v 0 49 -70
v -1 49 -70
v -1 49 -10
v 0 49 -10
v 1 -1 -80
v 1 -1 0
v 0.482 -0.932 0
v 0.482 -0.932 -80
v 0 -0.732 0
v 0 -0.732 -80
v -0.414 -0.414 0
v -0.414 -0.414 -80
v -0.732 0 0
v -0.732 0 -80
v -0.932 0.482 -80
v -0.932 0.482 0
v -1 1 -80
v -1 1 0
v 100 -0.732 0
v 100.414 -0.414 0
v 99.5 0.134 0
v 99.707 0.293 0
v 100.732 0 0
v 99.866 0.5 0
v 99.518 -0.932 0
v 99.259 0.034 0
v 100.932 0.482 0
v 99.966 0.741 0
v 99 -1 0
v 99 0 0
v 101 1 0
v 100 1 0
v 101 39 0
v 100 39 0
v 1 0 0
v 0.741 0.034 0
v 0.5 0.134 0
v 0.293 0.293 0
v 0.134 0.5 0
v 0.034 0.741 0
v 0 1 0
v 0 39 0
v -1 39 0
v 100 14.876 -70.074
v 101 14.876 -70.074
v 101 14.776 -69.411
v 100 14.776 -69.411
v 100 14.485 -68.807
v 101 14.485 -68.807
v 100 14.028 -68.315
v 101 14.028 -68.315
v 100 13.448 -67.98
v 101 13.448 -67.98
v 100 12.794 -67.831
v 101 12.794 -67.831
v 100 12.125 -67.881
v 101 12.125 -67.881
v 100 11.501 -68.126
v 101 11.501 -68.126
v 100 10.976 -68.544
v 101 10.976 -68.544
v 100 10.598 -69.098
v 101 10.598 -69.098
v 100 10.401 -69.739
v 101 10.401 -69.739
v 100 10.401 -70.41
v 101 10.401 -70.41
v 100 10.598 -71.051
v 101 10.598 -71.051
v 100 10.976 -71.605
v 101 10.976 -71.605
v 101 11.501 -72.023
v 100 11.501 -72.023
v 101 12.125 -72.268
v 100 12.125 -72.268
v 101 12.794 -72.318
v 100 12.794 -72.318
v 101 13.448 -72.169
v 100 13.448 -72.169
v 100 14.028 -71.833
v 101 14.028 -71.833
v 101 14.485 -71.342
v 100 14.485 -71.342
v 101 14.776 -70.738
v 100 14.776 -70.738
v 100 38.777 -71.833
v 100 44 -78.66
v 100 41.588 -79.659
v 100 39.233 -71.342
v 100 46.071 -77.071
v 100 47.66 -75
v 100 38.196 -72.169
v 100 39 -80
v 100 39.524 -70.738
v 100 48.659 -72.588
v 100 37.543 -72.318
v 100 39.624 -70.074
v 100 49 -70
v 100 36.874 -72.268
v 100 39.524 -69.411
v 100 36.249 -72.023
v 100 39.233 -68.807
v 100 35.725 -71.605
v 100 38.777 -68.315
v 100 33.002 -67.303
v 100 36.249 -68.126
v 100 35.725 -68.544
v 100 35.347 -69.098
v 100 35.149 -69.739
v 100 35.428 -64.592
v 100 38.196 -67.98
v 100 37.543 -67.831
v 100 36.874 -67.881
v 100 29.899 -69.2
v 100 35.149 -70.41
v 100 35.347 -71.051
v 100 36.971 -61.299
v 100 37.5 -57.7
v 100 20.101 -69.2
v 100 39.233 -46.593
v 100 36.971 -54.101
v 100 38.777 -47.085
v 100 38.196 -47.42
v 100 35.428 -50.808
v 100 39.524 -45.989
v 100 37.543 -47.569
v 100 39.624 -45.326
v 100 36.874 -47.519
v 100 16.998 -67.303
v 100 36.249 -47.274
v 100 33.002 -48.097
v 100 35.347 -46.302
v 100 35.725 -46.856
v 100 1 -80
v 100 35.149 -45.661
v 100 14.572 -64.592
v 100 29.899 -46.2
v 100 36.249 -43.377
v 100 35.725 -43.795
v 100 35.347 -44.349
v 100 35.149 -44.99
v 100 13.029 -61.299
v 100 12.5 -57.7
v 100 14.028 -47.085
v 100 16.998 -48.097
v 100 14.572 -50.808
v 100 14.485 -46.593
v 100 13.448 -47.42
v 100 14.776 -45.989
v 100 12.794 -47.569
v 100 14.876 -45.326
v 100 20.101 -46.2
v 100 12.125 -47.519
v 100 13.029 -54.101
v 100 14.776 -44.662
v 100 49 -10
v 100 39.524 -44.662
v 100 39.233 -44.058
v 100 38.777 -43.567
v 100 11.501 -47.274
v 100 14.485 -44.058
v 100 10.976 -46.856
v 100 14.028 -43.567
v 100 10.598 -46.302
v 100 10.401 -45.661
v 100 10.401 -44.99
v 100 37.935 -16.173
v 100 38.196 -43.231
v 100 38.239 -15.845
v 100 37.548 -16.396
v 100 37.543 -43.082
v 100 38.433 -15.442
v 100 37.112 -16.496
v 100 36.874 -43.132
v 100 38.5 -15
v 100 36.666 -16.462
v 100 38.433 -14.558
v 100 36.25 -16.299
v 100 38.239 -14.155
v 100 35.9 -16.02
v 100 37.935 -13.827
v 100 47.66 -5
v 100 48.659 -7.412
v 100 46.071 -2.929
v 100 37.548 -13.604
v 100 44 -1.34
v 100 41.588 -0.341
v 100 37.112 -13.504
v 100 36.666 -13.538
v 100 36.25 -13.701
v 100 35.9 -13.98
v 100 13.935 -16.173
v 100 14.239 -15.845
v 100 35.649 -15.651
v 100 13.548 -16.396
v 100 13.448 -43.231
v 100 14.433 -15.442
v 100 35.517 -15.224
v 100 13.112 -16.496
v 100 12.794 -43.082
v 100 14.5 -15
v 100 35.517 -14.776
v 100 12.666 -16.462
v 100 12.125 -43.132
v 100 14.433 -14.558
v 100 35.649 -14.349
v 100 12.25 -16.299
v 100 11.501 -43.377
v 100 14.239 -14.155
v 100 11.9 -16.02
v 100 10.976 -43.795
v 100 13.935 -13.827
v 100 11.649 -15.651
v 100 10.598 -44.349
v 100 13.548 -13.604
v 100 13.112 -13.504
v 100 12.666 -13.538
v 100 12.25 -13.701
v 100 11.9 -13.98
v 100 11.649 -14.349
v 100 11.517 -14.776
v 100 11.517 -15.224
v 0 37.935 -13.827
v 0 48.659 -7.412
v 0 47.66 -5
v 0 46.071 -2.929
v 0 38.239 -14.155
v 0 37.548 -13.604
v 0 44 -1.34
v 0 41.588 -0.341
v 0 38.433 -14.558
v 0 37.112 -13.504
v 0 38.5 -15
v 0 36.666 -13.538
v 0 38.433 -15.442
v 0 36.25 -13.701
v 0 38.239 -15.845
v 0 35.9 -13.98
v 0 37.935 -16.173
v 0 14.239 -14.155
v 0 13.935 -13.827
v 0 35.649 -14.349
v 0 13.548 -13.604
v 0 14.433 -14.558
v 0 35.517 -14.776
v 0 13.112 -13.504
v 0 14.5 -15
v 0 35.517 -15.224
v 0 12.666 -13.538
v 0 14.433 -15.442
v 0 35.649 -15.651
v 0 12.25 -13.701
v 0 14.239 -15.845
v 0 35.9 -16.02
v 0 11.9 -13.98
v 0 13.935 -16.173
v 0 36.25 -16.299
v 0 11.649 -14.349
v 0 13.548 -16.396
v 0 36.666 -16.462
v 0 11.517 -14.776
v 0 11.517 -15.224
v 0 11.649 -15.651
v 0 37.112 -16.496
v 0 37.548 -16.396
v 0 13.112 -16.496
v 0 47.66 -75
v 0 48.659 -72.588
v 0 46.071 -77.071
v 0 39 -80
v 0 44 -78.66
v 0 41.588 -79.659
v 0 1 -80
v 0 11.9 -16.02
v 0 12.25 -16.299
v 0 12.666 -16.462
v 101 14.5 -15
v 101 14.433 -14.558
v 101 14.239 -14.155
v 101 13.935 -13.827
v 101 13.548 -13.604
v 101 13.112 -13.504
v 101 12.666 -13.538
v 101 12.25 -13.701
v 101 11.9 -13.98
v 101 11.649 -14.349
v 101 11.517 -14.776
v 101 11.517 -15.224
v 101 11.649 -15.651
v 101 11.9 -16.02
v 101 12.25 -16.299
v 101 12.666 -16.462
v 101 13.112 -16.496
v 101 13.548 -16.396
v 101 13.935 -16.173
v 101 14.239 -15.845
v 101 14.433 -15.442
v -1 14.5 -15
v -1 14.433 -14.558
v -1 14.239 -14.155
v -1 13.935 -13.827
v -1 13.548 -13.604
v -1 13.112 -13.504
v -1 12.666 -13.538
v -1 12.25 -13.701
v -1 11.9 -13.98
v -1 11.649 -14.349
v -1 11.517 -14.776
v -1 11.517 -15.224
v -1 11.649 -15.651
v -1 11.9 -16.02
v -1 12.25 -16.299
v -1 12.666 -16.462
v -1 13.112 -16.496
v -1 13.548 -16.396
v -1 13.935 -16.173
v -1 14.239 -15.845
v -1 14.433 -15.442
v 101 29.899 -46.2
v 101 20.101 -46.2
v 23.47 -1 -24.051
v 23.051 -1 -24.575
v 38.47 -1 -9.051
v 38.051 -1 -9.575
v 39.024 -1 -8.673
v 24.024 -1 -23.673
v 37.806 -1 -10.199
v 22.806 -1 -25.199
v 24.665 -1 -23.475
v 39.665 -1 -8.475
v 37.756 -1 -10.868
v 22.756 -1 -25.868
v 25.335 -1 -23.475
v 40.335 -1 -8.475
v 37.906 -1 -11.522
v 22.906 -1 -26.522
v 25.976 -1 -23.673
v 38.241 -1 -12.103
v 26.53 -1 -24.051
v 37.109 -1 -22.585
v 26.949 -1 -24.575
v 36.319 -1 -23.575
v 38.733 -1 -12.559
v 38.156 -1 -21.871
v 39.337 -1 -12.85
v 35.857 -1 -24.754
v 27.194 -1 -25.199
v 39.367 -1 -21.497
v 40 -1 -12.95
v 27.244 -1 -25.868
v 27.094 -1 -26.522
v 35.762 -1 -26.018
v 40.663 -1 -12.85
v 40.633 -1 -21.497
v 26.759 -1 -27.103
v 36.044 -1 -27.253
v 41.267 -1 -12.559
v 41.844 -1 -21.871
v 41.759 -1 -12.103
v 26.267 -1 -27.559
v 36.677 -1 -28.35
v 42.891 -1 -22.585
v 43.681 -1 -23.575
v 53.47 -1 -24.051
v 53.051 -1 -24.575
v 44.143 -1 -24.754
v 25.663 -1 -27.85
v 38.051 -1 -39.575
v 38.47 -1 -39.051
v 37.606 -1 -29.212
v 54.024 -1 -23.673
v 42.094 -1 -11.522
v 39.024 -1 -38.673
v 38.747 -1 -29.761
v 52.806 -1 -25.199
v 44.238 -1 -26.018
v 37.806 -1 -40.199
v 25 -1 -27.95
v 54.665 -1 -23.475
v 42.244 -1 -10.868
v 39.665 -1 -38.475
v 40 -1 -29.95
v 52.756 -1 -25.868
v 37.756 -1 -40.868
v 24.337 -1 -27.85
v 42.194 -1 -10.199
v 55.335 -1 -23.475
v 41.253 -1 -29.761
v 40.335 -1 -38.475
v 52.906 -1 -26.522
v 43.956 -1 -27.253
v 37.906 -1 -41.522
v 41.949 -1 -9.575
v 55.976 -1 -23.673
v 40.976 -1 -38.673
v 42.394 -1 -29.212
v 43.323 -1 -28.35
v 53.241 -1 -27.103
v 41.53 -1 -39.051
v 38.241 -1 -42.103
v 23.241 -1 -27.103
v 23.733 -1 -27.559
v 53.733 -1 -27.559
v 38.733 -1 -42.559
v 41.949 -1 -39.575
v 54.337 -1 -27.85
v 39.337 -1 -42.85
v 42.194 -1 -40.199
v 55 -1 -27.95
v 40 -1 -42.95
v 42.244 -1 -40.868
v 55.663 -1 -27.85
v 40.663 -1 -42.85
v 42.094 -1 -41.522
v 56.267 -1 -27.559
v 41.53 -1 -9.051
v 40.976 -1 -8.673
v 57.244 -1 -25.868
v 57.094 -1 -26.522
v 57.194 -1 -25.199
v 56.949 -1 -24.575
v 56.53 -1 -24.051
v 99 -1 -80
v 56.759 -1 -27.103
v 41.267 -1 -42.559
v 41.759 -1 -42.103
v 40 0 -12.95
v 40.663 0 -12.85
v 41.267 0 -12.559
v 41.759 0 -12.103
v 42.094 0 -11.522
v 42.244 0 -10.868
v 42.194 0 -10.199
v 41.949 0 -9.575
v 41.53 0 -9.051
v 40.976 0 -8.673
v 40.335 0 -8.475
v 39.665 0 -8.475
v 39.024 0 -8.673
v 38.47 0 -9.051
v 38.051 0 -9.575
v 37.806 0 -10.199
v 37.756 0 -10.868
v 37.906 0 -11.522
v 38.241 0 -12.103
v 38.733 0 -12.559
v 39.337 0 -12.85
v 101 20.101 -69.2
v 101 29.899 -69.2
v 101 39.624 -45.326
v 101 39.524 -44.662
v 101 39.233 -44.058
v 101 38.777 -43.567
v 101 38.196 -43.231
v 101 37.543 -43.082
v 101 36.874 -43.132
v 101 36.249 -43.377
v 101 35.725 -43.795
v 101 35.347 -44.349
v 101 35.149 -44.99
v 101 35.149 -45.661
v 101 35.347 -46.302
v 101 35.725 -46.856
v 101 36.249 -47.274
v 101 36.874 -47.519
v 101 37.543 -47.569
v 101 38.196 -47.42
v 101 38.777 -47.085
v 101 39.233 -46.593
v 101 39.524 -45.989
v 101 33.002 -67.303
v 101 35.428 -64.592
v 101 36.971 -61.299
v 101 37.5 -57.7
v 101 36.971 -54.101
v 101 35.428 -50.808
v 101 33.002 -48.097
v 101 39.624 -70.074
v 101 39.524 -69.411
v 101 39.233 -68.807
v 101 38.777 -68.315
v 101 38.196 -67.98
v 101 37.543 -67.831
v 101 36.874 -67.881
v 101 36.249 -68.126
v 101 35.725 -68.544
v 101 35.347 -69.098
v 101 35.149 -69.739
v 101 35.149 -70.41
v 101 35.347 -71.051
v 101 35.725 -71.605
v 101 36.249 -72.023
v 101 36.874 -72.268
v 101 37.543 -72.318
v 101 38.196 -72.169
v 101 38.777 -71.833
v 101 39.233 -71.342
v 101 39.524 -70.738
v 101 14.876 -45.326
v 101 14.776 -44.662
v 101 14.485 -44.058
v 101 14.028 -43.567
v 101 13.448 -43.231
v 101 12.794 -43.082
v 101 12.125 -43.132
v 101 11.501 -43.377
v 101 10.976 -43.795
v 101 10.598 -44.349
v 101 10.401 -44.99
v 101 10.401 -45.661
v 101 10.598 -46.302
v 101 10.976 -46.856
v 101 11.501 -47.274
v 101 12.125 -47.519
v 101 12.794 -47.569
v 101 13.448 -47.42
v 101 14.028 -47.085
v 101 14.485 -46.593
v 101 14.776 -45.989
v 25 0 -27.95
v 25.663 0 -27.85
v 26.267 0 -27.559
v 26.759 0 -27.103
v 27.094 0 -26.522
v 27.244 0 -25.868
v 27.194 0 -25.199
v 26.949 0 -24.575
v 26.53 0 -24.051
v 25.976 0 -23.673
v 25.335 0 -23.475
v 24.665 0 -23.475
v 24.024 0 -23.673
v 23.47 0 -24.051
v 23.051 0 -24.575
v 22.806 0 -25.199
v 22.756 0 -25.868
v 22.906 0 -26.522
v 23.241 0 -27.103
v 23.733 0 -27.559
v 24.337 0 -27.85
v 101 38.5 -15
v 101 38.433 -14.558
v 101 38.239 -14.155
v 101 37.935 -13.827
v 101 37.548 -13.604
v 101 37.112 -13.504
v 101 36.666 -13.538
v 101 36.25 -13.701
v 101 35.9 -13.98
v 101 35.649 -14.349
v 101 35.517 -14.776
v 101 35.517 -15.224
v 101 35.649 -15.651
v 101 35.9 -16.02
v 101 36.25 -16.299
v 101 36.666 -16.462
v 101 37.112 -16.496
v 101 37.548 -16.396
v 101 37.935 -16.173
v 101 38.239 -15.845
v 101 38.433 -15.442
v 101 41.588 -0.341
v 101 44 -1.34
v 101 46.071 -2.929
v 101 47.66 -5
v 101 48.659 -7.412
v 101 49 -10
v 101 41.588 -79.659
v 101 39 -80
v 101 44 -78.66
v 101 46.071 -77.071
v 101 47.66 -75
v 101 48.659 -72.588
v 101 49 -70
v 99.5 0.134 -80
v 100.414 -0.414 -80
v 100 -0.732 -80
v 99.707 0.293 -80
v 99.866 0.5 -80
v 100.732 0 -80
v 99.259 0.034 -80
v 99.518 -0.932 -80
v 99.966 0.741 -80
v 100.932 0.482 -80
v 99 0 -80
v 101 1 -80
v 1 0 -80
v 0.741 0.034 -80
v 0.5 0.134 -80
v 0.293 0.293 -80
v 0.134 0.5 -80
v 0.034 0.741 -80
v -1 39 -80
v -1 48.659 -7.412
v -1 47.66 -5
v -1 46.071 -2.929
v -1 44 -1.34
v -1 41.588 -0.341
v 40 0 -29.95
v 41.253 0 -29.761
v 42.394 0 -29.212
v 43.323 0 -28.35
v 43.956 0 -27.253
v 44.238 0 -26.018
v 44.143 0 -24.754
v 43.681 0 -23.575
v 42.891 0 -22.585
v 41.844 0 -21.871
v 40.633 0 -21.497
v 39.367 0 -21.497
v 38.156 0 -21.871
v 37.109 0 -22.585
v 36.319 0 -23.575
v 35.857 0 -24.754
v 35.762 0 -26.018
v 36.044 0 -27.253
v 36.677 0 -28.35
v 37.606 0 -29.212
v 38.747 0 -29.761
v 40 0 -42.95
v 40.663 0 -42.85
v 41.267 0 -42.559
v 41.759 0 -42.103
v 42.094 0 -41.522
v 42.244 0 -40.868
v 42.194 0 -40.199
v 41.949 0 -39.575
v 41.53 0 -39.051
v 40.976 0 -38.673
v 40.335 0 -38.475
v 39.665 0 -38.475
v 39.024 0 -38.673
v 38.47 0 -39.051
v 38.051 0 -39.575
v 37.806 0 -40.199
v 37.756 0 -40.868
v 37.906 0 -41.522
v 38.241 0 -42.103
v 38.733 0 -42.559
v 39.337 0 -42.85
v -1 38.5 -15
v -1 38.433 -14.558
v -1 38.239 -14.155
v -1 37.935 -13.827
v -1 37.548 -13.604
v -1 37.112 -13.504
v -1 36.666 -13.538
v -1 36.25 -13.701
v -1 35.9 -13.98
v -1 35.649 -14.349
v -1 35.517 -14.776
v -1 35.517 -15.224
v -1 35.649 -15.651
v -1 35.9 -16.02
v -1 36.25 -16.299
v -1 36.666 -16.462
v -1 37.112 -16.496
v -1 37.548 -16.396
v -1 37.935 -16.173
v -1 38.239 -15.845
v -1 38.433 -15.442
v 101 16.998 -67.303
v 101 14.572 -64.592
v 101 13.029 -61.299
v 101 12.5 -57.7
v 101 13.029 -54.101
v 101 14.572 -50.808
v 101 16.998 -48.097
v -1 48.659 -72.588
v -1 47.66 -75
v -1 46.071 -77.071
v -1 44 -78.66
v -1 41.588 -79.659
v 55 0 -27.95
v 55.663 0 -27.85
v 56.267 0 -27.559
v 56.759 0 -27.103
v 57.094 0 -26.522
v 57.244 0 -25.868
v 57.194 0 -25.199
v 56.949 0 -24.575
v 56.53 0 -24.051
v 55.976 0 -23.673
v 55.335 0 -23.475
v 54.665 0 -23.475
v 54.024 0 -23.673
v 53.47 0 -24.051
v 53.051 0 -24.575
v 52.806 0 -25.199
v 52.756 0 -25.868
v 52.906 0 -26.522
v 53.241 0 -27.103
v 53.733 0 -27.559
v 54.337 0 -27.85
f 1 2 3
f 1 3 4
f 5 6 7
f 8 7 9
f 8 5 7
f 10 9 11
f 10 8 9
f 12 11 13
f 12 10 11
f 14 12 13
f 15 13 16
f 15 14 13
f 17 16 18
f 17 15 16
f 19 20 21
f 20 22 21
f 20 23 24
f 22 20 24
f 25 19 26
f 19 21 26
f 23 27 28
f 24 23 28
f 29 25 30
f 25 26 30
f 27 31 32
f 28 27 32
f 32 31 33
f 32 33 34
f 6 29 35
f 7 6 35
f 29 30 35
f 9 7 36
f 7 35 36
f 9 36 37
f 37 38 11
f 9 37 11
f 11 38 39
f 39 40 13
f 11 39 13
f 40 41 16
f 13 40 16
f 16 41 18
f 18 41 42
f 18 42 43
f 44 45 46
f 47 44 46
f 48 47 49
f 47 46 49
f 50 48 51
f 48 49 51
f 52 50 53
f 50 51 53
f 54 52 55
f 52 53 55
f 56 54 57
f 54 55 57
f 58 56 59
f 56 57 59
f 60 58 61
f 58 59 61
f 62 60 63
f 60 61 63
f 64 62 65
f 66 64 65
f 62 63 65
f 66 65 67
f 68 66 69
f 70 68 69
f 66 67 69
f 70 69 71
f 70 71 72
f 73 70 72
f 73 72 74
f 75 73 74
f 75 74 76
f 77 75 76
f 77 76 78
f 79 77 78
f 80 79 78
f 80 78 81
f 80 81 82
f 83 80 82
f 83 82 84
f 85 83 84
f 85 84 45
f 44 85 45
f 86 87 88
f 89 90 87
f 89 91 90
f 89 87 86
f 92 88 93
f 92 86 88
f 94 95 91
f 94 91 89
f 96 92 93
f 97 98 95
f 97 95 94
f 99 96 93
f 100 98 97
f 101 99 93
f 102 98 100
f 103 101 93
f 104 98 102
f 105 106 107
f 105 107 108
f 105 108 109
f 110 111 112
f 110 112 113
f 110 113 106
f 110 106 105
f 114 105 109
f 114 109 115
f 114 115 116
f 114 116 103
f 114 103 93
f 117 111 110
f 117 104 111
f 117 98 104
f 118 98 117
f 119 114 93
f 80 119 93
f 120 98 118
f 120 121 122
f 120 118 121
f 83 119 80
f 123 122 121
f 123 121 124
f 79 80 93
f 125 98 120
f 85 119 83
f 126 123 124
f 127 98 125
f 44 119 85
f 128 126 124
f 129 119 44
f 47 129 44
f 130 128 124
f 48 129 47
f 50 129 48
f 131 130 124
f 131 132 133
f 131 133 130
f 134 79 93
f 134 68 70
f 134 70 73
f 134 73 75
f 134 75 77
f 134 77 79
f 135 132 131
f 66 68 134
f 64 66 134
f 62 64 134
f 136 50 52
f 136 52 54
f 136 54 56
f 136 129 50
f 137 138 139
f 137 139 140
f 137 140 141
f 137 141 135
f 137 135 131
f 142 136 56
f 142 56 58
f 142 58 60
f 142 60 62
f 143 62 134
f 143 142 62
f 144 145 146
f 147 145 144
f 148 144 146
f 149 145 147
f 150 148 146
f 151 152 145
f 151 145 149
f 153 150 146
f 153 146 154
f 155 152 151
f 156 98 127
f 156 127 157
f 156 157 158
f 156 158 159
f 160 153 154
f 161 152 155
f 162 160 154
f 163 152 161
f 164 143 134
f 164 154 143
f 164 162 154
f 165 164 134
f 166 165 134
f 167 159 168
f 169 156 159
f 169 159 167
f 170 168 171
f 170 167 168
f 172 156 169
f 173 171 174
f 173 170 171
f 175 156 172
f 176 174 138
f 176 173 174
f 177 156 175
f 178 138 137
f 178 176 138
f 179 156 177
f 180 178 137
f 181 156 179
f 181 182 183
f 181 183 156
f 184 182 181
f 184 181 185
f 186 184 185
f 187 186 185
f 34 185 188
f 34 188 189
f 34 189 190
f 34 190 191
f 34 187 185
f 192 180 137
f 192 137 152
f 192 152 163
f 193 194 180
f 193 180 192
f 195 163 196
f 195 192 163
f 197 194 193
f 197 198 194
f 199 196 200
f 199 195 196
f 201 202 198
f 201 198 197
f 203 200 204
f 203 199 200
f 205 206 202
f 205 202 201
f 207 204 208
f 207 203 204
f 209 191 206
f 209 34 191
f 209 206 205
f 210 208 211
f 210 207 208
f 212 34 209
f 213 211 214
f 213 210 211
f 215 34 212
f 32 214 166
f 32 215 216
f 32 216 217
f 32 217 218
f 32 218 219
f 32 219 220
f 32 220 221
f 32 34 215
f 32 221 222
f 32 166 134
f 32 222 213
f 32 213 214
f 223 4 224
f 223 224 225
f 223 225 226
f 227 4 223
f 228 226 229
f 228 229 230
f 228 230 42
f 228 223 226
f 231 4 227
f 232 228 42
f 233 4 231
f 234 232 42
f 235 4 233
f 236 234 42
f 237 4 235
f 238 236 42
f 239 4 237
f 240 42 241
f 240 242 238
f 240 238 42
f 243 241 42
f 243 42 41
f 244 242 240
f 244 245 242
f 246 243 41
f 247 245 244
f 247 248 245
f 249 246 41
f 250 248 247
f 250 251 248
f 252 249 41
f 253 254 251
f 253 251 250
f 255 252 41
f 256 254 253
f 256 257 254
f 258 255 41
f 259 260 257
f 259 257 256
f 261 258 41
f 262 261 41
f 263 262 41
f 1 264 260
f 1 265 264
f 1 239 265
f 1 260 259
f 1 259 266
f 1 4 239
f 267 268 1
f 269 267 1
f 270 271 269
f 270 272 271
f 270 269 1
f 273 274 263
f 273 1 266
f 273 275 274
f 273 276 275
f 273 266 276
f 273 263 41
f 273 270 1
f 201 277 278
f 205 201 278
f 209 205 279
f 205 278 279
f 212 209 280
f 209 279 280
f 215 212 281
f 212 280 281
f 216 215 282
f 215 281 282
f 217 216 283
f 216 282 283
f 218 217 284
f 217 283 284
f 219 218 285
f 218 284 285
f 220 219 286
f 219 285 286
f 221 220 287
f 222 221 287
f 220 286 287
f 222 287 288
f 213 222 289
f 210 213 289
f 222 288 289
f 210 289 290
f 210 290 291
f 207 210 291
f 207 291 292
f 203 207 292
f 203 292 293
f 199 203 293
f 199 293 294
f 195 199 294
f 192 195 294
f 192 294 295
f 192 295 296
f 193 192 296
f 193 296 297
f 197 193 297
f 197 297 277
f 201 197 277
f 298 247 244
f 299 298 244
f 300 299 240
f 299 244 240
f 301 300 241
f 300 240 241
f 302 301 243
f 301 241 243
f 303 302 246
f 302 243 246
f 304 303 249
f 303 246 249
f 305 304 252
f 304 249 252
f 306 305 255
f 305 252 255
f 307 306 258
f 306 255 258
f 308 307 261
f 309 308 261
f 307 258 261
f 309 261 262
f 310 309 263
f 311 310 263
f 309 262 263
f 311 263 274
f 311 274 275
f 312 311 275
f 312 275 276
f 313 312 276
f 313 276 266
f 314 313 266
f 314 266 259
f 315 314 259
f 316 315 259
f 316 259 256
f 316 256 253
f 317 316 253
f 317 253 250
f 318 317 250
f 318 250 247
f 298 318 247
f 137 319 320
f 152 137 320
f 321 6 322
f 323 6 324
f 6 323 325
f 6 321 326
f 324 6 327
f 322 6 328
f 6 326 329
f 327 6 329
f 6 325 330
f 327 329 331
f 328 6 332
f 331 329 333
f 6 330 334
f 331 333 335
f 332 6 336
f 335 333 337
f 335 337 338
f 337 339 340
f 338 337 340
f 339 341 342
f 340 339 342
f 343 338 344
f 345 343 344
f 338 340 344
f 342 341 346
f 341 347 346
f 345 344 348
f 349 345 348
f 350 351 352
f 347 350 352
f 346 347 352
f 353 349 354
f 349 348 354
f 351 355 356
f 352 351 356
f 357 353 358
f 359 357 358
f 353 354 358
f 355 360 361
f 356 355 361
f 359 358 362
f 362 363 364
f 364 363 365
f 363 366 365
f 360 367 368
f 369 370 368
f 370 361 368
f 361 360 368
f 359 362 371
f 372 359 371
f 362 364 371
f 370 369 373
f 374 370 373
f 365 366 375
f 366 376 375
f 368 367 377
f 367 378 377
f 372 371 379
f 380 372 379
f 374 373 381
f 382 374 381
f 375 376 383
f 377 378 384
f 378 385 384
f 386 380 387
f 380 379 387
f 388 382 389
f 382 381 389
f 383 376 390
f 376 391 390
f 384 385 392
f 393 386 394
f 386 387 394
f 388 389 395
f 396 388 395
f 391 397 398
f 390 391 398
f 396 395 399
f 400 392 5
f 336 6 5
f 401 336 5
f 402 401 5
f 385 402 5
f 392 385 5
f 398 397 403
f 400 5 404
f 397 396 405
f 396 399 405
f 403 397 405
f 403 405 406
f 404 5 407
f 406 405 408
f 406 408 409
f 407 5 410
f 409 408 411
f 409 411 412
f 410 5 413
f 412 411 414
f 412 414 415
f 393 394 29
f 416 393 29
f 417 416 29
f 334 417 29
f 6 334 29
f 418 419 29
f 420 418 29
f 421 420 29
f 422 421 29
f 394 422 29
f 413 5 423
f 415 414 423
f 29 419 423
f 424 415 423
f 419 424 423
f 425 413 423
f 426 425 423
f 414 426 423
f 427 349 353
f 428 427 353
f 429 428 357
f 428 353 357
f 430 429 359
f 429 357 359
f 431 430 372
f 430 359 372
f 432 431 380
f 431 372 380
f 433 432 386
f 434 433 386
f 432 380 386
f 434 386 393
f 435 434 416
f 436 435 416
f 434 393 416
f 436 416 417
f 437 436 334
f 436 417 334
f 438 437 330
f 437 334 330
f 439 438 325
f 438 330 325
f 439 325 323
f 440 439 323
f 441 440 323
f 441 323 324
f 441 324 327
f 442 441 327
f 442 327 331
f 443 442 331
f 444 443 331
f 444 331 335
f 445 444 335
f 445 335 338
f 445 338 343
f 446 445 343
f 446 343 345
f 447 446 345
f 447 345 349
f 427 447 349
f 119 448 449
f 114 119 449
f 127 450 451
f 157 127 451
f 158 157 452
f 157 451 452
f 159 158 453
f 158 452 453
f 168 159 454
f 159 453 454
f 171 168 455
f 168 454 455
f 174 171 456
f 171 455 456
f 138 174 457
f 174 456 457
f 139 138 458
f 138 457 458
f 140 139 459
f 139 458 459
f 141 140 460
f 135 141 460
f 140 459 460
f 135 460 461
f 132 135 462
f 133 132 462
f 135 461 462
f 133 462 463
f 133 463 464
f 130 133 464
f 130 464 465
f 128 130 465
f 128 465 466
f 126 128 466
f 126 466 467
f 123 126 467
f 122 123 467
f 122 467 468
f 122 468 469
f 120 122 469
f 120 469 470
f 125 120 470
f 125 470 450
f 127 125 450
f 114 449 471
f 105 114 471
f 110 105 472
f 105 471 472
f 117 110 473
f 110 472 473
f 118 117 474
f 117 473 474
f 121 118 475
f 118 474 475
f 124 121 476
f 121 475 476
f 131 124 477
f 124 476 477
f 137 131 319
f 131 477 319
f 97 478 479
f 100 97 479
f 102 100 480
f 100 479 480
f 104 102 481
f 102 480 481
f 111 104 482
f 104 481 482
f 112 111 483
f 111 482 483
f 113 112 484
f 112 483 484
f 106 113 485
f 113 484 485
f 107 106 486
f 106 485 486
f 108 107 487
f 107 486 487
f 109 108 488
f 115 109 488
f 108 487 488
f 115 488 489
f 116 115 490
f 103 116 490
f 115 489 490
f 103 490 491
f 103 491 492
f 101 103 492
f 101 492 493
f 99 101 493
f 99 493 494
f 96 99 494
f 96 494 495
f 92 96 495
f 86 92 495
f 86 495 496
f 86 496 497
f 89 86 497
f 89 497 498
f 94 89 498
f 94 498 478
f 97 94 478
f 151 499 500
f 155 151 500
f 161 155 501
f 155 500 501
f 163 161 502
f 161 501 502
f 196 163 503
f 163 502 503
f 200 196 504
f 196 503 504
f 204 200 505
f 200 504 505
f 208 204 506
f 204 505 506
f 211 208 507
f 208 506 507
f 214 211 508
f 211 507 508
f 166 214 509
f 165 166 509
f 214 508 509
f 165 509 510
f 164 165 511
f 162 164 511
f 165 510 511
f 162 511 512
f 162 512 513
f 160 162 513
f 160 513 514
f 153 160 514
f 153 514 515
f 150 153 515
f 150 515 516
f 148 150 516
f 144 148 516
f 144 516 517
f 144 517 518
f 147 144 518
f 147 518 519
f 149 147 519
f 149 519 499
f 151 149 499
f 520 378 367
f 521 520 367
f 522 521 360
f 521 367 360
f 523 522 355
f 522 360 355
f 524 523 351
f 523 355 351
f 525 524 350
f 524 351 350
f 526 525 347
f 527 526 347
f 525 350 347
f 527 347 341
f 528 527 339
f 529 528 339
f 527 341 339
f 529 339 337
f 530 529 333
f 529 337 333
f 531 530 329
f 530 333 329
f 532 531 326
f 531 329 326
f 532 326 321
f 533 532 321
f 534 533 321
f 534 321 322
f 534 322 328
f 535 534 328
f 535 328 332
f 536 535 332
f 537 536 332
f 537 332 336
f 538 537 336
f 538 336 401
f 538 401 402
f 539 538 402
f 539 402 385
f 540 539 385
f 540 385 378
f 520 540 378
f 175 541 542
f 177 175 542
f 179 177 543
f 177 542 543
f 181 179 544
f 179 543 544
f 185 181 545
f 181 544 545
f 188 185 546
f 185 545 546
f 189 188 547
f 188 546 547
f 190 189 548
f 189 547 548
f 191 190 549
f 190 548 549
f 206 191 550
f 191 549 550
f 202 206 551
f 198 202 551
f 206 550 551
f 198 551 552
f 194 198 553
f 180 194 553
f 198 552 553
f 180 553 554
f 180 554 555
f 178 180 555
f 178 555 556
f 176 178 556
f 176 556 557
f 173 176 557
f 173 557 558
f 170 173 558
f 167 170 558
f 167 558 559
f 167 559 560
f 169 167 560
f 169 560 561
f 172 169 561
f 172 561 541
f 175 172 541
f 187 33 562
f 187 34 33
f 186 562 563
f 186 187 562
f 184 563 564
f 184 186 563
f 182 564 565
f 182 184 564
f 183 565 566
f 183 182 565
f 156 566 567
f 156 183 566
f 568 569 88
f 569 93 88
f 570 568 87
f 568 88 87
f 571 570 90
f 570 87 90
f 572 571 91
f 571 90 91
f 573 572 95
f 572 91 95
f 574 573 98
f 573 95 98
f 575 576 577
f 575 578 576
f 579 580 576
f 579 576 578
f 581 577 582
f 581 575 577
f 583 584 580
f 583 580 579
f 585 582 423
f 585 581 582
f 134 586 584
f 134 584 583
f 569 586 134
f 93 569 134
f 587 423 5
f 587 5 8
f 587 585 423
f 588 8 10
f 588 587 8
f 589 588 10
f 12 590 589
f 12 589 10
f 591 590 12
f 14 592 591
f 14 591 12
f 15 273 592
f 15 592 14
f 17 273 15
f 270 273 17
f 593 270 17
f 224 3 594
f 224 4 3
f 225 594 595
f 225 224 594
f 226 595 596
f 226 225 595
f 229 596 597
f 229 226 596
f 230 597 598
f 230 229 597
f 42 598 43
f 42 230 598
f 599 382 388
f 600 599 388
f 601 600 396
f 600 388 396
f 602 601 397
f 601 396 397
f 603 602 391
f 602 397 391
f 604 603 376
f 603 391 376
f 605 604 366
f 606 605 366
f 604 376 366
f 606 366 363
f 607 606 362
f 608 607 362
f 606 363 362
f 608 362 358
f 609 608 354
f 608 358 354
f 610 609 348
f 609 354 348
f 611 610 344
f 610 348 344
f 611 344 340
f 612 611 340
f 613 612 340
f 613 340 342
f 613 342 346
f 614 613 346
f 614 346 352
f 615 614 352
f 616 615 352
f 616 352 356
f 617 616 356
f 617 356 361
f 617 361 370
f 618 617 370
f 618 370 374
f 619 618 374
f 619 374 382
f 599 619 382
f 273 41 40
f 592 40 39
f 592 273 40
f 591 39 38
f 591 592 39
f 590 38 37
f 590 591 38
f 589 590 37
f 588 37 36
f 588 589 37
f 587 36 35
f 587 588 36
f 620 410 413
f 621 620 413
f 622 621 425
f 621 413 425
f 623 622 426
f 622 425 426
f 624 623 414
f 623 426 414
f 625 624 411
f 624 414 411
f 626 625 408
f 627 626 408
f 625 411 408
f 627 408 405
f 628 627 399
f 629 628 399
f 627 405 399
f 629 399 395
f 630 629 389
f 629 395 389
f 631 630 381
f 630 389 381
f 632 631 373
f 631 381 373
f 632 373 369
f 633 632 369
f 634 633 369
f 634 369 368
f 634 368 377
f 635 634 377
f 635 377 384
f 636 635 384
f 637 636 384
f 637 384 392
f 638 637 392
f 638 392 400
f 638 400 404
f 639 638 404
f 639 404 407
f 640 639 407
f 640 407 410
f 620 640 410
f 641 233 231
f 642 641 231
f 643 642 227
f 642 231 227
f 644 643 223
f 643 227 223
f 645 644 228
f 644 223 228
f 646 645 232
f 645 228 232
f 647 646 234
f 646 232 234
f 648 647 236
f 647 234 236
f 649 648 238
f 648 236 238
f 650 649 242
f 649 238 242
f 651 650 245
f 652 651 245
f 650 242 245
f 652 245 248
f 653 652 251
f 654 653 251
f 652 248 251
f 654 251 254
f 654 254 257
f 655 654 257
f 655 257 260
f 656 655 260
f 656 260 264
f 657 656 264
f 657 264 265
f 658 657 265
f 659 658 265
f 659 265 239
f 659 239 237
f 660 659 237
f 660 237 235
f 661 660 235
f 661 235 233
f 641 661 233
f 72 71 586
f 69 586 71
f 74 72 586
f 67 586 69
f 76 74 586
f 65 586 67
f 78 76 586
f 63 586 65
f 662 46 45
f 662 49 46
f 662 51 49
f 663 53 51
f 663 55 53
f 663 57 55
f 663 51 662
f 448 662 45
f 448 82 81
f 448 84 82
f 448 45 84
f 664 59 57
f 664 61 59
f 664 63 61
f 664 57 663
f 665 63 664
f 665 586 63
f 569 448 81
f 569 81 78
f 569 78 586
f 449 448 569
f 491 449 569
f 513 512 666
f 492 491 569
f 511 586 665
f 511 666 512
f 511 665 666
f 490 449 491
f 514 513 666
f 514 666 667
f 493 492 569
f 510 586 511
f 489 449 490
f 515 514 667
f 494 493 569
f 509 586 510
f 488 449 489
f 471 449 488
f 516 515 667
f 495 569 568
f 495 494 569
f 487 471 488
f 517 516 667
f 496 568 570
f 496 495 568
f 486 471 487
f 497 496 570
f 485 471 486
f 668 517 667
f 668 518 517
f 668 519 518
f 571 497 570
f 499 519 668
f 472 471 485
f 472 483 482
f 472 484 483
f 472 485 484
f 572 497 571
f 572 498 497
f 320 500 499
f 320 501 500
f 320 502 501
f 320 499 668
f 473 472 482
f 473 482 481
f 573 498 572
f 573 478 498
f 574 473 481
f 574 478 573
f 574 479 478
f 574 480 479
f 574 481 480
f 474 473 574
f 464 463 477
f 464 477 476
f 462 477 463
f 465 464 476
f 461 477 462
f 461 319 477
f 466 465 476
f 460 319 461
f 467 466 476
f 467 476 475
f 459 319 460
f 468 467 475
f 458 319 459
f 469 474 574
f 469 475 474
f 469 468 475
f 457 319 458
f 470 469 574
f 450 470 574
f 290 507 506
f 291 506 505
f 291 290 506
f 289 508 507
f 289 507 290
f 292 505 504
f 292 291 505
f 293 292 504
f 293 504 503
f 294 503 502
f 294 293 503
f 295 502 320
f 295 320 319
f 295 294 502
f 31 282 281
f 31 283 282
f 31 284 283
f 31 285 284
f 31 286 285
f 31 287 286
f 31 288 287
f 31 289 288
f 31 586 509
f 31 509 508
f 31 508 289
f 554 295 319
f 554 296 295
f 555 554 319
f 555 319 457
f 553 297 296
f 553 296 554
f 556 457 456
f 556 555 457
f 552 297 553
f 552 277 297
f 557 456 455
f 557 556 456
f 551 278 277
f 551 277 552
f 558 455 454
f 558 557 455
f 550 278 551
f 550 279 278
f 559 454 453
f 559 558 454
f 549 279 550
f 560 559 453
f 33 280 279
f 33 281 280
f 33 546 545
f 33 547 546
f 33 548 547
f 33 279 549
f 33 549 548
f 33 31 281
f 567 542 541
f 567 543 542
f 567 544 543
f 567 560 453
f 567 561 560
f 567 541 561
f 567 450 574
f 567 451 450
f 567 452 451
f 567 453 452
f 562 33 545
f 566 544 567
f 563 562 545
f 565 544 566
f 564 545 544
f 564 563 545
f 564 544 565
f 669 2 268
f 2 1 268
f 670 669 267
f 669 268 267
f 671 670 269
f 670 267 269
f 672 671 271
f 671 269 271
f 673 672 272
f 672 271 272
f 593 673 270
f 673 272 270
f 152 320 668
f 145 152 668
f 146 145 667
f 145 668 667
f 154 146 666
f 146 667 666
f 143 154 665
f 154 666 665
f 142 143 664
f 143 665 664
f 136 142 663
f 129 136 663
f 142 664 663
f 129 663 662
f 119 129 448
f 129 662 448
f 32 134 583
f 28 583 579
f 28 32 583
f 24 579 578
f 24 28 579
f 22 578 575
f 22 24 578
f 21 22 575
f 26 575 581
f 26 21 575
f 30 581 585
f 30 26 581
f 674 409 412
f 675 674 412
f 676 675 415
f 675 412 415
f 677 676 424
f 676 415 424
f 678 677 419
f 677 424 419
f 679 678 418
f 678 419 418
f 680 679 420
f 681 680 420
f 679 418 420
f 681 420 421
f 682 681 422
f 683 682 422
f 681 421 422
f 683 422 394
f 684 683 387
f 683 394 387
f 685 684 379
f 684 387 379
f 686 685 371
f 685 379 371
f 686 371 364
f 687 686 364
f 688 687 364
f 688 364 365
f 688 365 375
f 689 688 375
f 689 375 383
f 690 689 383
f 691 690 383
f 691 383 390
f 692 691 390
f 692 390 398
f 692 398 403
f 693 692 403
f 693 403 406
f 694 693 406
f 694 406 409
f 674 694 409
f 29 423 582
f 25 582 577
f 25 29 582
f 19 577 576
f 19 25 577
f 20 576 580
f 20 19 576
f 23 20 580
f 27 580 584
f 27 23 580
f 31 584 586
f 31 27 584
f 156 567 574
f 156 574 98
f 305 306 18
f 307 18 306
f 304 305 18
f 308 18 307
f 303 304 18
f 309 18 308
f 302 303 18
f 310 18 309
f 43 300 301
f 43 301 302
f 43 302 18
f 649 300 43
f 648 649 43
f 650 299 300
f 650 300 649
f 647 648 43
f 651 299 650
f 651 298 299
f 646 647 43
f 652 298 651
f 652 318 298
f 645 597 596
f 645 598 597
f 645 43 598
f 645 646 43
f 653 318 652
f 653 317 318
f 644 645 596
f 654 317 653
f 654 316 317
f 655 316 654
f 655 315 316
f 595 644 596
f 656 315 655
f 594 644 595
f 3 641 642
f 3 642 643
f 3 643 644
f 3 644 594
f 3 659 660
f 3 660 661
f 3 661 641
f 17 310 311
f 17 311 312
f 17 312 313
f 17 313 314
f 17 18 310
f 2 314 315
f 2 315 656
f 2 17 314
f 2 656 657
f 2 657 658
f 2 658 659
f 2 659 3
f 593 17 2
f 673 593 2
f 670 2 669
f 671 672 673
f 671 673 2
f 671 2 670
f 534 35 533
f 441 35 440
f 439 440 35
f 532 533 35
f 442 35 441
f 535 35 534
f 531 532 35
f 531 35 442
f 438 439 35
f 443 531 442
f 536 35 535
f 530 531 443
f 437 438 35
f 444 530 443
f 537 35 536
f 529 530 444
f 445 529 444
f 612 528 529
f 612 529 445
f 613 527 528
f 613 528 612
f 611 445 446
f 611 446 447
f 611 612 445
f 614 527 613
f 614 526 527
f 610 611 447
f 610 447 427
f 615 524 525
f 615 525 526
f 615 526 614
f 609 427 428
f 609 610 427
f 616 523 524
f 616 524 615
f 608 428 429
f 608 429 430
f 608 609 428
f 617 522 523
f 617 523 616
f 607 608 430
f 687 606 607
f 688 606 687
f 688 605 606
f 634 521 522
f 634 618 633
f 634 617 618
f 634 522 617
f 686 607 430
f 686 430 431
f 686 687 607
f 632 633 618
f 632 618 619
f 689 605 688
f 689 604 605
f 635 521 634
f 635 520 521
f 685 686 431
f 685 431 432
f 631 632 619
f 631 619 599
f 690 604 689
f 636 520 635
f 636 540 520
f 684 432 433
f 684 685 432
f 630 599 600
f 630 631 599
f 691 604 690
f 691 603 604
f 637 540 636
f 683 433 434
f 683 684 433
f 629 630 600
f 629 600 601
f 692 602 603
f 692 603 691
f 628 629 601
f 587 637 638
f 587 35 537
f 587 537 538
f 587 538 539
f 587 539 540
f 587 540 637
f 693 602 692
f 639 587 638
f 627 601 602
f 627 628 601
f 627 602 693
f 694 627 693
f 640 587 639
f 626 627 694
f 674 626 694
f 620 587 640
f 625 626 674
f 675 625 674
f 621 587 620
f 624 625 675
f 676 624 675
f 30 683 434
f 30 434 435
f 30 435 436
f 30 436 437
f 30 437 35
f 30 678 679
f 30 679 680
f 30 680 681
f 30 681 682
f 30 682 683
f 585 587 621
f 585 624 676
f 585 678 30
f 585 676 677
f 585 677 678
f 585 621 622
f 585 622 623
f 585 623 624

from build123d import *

# Parameters (mm, degrees)
SKETCH1_W                    = 100
SKETCH1_H                    = 80
BASE_FLANGE1_DEPTH           = 1
EDGE_FLANGE1_STRIP_W         = 6
EDGE_FLANGE1_STRIP_H         = 1
EDGE_FLANGE1_STRIP_CUT_DEPTH = 80
EDGE_FLANGE1_DEPTH           = 80
EDGE_FLANGE2_STRIP_W         = 6
EDGE_FLANGE2_STRIP_H         = 1
EDGE_FLANGE2_STRIP_CUT_DEPTH = 80
EDGE_FLANGE2_DEPTH           = 80
FILLET1_R                    = 10
SKETCH12_R                   = 2.25
CUT_EXTRUDE1_DEPTH           = 10
SKETCH14_R                   = 4.25
SKETCH14_R_2                 = 2.25
CUT_EXTRUDE3_DEPTH           = 10
SKETCH15_R                   = 1.5
CUT_EXTRUDE4_DEPTH           = 167.440085507


# Sheet-metal steps are written as plain solids
with BuildPart() as part:
    # Sketch1 → Base-Flange1 (new body)
    with BuildSketch(Plane(origin=(0, 0, 0), x_dir=(1, 0, 0), z_dir=(0, 1, 0))):
        with Locations((50, 40)):
            Rectangle(SKETCH1_W, SKETCH1_H)
    extrude(amount=-BASE_FLANGE1_DEPTH)

    # Edge-Flange1 strip (across the edge) → Edge-Flange1 strip cut (cut)
    with BuildSketch(Plane(origin=(100, 0, 0), x_dir=(-1, 0, 0), z_dir=(0, 0, -1))):
        with Locations((-2, -0.5)):
            Rectangle(EDGE_FLANGE1_STRIP_W, EDGE_FLANGE1_STRIP_H)
    extrude(amount=EDGE_FLANGE1_STRIP_CUT_DEPTH, mode=Mode.SUBTRACT)

    # Edge-Flange1 section (across the edge) → Edge-Flange1 (add)
    with BuildSketch(Plane(origin=(100, 0, 0), x_dir=(-1, 0, 0), z_dir=(0, 0, -1))):
        with BuildLine():
            Line((-1, 1), (-1, 49))
            Line((-1, 49), (0, 49))
            Line((0, 49), (0, 1))
            ThreePointArc((0, 1), (0.292893219, 0.292893219), (1, 0))
            Line((1, 0), (1, -1))
            ThreePointArc((1, -1), (-0.414213562, -0.414213562), (-1, 1))
        make_face()
    extrude(amount=EDGE_FLANGE1_DEPTH)

    # Edge-Flange2 strip (across the edge) → Edge-Flange2 strip cut (cut)
    with BuildSketch(Plane.XY.offset(-80)):
        with Locations((-2, -0.5)):
            Rectangle(EDGE_FLANGE2_STRIP_W, EDGE_FLANGE2_STRIP_H)
    extrude(amount=EDGE_FLANGE2_STRIP_CUT_DEPTH, mode=Mode.SUBTRACT)

    # Edge-Flange2 section (across the edge) → Edge-Flange2 (add)
    with BuildSketch(Plane.XY.offset(-80)):
        with BuildLine():
            Line((-1, 1), (-1, 49))
            Line((-1, 49), (0, 49))
            Line((0, 49), (0, 1))
            ThreePointArc((0, 1), (0.292893219, 0.292893219), (1, 0))
            Line((1, 0), (1, -1))
            ThreePointArc((1, -1), (-0.414213562, -0.414213562), (-1, 1))
        make_face()
    extrude(amount=EDGE_FLANGE2_DEPTH)

    # Fillet1
    fillet1_edges = [part.edges().sort_by_distance(p)[0] for p in [
        (100.5, 49, 0),
        (100.5, 49, -80),
        (-0.5, 49, -80),
        (-0.5, 49, 0),
    ]]
    fillet(fillet1_edges, radius=FILLET1_R)

    # Sketch12 → Cut-Extrude1 (cut)
    with BuildSketch(Plane(origin=(101, 81.373526732, -102.532454166), x_dir=(0, 0, 1), z_dir=(1, 0, 0))):
        with BuildLine():
            ThreePointArc((56.332454166, 61.272506218), (44.832454166, 68.873526732), (33.332454166, 61.272506218))
            Line((33.332454166, 61.272506218), (33.332454166, 51.474547246))
            ThreePointArc((33.332454166, 51.474547246), (44.832454166, 43.873526732), (56.332454166, 51.474547246))
            Line((56.332454166, 51.474547246), (56.332454166, 61.272506218))
        make_face()
        with Locations(Location((32.458085495, 68.747895403, 0), (0, 0, 270))):
            Circle(SKETCH12_R)
        with Locations(Location((57.206822836, 68.747895403, 0), (0, 0, 270))):
            Circle(SKETCH12_R)
        with Locations(Location((57.206822836, 43.999158061, 0), (0, 0, 270))):
            Circle(SKETCH12_R)
        with Locations(Location((32.458085495, 43.999158061, 0), (0, 0, 270))):
            Circle(SKETCH12_R)
    extrude(amount=-CUT_EXTRUDE1_DEPTH, mode=Mode.SUBTRACT)

    # Sketch14 → Cut-Extrude3 (cut)
    with BuildSketch(Plane(origin=(82.686654231, -1, -102.532454166), x_dir=(-1, 0, 0), z_dir=(0, -1, 0))):
        with Locations(Location((42.686654231, -76.832454166, 0), (0, 0, 90))):
            Circle(SKETCH14_R)
        with Locations(Location((57.686654231, -76.832454166, 0), (0, 0, 90))):
            Circle(SKETCH14_R_2)
        with Locations(Location((42.686654231, -61.832454166, 0), (0, 0, 90))):
            Circle(SKETCH14_R_2)
        with Locations(Location((27.686654231, -76.832454166, 0), (0, 0, 90))):
            Circle(SKETCH14_R_2)
        with Locations(Location((42.686654231, -91.832454166, 0), (0, 0, 90))):
            Circle(SKETCH14_R_2)
    extrude(amount=-CUT_EXTRUDE3_DEPTH, mode=Mode.SUBTRACT)

    # Sketch15 → Cut-Extrude4 (cut, through all)
    with BuildSketch(Plane(origin=(101, 81.373526732, -102.532454166), x_dir=(0, 0, 1), z_dir=(1, 0, 0))):
        with Locations(Location((87.532454166, 44.373526732, 0), (0, 0, 270))):
            Circle(SKETCH15_R)
        with Locations(Location((87.532454166, 68.373526732, 0), (0, 0, 270))):
            Circle(SKETCH15_R)
    extrude(amount=-CUT_EXTRUDE4_DEPTH, mode=Mode.SUBTRACT)


solid = part.part
